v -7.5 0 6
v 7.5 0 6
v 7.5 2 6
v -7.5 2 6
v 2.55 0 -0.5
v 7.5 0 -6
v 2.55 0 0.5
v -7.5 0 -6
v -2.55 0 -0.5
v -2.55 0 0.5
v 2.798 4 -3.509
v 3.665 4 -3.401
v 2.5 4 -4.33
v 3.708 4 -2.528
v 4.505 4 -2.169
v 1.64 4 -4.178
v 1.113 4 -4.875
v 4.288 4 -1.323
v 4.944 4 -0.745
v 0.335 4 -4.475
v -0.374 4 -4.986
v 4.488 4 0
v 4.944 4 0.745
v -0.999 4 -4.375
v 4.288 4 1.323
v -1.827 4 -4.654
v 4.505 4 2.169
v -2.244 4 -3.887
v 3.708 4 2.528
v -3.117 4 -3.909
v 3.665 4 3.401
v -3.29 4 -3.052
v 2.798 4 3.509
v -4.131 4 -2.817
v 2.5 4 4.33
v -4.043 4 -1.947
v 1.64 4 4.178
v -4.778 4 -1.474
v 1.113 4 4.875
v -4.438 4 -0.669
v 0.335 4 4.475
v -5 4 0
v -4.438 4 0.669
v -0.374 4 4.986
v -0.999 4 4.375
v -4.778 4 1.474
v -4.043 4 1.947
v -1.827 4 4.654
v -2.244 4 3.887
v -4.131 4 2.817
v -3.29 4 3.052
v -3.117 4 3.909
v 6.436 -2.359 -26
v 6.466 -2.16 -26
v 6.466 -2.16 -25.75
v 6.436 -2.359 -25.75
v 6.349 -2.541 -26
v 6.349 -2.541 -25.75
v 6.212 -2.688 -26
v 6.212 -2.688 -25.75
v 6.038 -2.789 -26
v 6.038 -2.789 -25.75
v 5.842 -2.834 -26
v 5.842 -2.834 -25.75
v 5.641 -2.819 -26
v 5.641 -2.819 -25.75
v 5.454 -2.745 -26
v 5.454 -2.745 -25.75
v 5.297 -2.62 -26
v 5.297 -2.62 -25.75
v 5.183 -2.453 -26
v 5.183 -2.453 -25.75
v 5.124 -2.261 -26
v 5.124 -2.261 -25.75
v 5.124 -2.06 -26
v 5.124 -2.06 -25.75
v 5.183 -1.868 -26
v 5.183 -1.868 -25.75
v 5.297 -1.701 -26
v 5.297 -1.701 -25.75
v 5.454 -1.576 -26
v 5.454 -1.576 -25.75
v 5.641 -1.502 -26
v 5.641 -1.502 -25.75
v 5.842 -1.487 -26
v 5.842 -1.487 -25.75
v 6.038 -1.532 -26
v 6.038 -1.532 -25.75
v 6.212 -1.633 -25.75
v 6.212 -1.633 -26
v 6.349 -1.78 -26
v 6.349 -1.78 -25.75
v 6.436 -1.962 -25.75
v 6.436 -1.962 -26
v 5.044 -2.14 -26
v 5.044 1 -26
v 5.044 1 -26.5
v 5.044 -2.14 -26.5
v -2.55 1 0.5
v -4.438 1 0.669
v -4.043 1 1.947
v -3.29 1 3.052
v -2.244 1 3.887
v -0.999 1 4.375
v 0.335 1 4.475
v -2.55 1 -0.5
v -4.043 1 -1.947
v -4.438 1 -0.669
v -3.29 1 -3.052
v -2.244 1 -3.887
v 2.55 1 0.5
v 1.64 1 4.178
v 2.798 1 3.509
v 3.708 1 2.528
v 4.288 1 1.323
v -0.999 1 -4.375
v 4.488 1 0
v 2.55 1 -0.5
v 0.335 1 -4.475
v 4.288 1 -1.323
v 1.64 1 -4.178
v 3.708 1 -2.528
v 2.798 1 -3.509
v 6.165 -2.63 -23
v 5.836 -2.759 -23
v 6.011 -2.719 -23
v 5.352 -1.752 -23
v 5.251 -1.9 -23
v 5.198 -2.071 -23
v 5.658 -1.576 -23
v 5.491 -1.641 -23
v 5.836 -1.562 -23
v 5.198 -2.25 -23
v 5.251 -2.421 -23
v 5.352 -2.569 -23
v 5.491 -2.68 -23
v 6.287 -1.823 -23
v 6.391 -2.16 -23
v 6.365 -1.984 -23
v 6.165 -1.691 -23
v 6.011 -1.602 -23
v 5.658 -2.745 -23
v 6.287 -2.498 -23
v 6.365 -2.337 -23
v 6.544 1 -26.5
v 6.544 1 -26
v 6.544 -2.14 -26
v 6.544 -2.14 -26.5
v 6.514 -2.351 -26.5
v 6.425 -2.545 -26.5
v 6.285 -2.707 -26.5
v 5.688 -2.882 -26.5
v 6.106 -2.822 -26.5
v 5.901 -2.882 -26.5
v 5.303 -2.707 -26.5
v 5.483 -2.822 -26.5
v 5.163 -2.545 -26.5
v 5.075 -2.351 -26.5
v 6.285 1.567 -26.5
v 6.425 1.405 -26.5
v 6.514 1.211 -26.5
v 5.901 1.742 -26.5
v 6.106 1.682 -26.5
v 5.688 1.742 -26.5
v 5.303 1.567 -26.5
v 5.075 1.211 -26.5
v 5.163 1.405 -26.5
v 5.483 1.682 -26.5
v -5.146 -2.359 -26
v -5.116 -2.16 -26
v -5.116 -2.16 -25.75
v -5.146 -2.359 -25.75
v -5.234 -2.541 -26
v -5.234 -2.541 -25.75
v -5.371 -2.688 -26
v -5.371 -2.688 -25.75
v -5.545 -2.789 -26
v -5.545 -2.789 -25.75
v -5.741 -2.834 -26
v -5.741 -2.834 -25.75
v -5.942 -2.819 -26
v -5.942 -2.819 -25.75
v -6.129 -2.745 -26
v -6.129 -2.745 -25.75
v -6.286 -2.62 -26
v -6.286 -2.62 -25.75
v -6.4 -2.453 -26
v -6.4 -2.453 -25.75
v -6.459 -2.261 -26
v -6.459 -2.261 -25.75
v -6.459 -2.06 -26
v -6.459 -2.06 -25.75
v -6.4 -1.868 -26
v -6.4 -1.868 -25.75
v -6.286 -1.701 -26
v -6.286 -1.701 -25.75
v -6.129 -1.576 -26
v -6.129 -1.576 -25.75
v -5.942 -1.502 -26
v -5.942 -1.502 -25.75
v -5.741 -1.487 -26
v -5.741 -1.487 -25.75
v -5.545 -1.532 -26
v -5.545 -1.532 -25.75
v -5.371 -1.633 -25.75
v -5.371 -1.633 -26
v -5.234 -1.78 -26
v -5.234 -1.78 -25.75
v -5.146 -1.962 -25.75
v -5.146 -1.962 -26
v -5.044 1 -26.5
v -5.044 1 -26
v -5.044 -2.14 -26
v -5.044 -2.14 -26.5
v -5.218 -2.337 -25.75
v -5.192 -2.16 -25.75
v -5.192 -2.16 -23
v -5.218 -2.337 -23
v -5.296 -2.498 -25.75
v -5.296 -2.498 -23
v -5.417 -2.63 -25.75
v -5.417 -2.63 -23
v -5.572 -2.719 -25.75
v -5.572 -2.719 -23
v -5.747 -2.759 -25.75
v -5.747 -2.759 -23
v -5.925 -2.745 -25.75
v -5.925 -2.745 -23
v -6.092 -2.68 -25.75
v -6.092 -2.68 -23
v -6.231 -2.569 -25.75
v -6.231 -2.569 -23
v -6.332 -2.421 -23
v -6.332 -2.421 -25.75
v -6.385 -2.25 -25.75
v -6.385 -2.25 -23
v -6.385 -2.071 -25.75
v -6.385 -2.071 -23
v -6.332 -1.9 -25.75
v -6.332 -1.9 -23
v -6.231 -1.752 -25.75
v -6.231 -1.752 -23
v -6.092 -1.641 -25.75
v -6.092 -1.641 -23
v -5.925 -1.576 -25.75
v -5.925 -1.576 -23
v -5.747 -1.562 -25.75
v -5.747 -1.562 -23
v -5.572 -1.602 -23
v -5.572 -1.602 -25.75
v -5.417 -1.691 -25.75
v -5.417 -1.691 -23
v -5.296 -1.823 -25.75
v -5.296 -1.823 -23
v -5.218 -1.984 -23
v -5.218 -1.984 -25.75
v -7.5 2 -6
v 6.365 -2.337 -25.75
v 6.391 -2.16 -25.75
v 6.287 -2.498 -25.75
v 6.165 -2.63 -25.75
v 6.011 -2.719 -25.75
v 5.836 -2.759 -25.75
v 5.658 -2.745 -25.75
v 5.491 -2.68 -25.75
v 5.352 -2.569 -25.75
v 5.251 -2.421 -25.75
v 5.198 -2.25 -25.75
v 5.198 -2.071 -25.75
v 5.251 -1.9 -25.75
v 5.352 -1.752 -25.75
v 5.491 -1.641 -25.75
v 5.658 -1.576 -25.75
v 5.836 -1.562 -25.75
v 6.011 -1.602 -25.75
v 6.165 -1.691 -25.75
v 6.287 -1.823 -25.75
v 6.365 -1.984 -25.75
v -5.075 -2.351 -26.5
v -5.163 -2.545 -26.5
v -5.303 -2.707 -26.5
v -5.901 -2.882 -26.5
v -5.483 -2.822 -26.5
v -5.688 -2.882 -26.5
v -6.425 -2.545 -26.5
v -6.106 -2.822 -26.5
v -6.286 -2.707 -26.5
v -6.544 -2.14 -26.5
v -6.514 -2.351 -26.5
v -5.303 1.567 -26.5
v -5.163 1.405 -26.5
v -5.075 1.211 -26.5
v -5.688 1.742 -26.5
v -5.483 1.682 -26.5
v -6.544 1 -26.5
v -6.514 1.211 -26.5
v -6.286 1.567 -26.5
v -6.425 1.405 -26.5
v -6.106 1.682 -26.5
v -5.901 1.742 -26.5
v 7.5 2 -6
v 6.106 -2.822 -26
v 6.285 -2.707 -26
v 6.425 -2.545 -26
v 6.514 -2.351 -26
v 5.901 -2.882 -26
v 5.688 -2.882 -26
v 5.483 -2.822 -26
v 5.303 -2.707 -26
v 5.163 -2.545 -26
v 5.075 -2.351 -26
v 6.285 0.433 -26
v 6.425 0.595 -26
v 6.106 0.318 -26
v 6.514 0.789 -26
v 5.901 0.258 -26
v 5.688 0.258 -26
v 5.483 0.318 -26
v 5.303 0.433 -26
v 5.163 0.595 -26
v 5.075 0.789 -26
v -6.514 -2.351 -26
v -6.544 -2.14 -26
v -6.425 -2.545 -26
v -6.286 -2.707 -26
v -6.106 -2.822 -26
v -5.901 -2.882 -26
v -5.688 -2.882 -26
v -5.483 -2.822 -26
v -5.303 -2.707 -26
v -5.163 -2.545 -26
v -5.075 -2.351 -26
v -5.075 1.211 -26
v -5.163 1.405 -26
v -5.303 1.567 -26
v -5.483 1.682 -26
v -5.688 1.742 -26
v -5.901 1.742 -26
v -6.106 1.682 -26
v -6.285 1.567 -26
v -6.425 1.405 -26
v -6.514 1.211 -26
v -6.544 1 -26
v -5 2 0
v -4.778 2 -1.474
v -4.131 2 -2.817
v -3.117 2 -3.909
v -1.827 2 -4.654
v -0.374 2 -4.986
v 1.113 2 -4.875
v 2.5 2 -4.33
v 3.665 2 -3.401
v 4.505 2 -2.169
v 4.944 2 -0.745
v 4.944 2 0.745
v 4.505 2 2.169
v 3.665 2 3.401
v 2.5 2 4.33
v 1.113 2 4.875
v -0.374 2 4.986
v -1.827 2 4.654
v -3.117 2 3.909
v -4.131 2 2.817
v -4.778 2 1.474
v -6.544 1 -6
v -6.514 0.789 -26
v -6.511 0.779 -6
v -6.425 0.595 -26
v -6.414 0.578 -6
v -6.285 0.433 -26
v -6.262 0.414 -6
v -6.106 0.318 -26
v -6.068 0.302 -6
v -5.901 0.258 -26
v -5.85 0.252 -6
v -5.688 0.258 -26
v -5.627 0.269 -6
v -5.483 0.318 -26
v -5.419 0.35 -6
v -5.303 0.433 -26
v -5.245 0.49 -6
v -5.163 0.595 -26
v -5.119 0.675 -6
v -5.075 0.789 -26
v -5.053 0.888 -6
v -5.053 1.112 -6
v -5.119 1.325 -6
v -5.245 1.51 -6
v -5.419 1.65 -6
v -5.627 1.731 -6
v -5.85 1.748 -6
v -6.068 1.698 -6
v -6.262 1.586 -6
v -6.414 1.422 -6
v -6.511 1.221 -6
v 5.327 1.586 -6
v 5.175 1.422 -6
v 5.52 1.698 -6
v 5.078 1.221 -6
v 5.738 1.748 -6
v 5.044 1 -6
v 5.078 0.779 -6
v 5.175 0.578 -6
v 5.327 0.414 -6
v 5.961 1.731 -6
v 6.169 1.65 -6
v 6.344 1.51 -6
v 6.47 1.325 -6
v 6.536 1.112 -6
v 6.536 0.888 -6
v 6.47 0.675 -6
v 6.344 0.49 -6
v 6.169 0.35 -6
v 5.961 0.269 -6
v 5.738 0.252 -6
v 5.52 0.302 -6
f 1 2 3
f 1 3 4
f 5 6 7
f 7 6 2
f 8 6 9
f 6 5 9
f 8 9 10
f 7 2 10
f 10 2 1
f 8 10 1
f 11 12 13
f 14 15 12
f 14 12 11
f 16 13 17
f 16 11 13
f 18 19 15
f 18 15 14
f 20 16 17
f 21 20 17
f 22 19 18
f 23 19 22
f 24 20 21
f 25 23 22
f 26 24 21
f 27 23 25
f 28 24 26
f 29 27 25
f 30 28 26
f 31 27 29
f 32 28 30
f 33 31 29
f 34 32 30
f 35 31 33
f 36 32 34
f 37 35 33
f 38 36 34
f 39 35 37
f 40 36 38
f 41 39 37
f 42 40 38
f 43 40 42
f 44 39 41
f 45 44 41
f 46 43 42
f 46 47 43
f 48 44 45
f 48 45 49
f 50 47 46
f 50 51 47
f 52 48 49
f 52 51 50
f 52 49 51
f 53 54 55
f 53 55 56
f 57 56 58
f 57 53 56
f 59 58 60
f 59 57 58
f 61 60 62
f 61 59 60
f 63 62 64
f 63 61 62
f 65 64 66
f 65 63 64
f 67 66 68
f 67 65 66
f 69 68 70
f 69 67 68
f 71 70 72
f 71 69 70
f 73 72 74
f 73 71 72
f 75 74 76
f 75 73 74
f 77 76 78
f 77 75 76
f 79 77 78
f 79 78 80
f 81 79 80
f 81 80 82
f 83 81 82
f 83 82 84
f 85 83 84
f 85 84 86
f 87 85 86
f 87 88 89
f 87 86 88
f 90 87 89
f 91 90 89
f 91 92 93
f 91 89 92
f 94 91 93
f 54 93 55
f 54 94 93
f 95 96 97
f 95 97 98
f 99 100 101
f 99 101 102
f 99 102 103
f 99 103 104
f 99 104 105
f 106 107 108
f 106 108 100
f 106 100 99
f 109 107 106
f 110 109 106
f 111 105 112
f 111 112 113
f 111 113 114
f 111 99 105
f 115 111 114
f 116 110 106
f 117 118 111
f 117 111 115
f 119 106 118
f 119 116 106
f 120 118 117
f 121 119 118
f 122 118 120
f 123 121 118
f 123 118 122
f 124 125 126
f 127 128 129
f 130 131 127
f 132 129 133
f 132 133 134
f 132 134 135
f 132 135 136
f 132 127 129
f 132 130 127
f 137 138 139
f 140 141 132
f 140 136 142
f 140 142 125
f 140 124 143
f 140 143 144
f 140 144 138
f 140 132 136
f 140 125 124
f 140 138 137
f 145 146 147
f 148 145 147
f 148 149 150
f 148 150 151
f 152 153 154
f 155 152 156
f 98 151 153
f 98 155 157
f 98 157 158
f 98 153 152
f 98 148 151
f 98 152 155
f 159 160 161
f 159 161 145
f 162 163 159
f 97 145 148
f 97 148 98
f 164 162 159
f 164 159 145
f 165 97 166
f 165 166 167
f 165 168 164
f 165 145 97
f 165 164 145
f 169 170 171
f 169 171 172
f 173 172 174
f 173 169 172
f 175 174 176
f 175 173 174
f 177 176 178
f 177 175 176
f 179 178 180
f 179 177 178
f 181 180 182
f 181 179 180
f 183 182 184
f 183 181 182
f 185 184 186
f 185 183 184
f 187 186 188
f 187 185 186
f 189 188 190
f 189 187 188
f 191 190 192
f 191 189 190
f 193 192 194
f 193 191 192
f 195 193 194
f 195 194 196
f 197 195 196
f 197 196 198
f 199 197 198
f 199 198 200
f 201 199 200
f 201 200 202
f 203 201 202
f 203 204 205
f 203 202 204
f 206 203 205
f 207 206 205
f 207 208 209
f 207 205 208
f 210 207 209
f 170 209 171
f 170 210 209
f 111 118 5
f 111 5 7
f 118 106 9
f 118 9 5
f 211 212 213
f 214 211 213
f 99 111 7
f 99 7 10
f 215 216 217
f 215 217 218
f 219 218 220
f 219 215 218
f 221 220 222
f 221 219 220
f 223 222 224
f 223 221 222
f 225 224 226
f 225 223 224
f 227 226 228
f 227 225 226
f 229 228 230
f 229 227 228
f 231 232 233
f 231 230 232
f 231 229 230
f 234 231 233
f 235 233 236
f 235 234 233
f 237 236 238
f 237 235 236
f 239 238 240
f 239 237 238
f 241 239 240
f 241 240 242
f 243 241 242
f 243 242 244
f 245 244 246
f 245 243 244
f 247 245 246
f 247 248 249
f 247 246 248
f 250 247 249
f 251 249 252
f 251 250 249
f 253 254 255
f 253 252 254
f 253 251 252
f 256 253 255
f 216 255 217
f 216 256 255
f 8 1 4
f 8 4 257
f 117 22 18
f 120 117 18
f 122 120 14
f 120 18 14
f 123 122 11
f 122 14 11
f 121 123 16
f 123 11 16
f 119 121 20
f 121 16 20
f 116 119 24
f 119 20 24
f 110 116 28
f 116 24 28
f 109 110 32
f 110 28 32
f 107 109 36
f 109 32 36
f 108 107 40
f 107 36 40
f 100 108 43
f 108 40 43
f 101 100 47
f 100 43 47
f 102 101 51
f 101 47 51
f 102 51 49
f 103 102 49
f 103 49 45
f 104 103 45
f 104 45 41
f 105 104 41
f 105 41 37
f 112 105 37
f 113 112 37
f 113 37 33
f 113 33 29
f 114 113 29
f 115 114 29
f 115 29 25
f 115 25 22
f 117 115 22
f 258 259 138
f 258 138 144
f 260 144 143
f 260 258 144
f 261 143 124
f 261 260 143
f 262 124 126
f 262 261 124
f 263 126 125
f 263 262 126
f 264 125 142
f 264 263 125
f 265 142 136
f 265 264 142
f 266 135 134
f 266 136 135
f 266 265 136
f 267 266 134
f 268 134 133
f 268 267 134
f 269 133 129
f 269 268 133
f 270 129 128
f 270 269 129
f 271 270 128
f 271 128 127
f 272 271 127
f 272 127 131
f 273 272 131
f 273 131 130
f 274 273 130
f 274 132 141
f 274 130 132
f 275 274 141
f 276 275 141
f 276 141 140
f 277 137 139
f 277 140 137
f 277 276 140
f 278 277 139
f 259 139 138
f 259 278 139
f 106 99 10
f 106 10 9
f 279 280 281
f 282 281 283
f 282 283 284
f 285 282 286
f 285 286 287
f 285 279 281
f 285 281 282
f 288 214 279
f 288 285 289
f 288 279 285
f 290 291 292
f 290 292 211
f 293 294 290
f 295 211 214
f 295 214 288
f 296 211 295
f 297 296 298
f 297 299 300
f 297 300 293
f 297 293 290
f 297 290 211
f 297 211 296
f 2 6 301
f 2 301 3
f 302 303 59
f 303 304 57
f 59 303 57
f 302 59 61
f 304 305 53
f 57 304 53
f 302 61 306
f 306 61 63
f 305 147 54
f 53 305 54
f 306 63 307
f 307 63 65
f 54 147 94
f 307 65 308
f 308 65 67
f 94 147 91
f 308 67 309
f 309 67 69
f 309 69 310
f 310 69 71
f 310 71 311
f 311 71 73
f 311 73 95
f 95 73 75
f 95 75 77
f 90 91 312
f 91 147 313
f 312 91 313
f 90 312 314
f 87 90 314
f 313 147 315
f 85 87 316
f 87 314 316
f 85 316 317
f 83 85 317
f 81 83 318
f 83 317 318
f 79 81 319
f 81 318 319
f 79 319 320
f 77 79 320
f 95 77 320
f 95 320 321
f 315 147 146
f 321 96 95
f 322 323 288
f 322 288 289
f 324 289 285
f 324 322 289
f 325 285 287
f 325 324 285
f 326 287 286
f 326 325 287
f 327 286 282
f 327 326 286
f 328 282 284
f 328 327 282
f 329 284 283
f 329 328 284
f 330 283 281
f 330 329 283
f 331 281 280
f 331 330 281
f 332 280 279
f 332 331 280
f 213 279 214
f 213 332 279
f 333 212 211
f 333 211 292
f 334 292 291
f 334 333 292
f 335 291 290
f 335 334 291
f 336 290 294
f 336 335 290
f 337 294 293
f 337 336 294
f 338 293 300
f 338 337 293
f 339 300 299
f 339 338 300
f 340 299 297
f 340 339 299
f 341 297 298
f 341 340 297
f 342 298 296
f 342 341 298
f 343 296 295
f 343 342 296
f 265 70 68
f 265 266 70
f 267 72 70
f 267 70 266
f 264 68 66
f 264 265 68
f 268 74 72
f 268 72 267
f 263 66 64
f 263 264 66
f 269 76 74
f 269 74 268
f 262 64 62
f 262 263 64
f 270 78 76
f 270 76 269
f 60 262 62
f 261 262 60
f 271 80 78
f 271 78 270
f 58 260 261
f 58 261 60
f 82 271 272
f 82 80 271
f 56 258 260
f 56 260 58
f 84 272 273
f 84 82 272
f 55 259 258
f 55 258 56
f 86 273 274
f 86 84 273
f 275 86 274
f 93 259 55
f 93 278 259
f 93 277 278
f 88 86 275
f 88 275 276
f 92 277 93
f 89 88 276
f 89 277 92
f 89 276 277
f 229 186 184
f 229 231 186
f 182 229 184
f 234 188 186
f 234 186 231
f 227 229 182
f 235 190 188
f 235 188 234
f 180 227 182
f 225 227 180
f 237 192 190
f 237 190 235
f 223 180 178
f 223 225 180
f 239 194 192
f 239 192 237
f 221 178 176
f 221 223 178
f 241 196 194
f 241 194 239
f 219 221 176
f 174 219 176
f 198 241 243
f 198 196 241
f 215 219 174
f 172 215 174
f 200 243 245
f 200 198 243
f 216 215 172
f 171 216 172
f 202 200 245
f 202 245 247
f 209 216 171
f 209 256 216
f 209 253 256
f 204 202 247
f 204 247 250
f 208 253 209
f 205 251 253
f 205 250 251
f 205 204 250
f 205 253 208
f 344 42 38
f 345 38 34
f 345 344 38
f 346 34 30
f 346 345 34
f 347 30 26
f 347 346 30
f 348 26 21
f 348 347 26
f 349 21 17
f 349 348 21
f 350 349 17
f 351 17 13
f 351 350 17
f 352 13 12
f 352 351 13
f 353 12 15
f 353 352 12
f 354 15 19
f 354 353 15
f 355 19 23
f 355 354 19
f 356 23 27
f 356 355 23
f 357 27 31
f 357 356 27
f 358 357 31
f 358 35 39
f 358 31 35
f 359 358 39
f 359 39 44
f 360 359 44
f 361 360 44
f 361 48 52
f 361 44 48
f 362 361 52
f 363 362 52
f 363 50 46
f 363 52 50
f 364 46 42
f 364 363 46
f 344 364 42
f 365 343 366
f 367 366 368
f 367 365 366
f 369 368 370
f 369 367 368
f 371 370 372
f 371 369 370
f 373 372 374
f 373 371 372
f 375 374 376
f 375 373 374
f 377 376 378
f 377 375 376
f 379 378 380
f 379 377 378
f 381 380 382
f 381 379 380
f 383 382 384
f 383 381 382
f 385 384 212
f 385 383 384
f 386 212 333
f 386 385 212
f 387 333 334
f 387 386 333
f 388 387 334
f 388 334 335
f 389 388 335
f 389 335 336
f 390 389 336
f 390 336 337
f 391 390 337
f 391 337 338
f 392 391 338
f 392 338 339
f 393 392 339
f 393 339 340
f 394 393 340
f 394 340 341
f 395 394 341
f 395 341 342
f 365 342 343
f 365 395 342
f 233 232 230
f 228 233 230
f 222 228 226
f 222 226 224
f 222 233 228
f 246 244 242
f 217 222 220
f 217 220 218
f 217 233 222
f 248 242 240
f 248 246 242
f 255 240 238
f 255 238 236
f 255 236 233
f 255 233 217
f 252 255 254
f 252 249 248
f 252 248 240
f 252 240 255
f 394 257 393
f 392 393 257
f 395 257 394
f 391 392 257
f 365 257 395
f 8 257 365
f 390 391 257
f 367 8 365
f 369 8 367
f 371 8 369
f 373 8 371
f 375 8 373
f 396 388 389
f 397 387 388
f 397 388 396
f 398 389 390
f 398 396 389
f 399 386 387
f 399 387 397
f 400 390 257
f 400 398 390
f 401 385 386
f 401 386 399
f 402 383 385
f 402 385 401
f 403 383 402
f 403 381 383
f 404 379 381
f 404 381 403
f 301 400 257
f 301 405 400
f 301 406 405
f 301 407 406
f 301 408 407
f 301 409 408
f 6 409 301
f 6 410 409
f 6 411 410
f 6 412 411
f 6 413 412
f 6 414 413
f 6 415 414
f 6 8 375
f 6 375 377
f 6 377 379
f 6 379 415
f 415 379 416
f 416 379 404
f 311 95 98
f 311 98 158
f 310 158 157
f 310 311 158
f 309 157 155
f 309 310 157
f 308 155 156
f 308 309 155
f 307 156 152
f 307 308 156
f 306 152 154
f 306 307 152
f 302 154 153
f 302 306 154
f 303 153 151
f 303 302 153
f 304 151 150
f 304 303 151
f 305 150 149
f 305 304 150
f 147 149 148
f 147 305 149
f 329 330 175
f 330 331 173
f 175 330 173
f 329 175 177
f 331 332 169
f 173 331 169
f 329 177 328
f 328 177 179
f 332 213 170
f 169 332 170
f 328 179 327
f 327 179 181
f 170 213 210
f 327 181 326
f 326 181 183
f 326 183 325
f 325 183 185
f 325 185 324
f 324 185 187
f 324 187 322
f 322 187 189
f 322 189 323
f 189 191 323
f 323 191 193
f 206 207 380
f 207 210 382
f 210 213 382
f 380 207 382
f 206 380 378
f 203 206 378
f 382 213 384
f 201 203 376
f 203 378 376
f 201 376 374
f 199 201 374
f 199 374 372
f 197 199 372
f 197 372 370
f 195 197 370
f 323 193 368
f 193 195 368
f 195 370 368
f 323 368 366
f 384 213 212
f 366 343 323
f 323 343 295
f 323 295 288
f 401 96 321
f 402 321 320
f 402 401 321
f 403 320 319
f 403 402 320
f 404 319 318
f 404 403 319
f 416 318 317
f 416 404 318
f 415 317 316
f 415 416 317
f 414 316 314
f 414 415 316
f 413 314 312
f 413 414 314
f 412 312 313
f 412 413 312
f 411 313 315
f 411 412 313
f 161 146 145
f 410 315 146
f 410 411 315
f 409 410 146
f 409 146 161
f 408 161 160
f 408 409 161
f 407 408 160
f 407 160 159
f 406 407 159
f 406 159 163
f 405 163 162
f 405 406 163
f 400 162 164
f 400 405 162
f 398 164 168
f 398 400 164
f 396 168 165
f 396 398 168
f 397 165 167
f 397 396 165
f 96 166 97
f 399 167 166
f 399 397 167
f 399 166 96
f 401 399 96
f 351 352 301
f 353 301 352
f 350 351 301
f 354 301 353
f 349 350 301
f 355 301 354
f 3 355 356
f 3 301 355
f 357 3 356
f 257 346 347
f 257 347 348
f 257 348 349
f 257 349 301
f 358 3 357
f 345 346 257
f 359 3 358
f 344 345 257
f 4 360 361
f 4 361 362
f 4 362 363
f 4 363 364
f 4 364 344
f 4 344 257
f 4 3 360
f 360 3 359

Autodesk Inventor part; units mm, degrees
ref_plane "YZ Plane" through (0, 0, 0) normal (1, 0, 0) x (0, 1, 0)
ref_plane "XZ Plane" through (0, 0, 0) normal (0, 1, 0) x (-1, 0, 0)
ref_plane "XY Plane" through (0, 0, 0) normal (0, 0, 1) x (1, 0, 0)
sketch "Sketch1" plane through (0, 0, 0) normal (0, 1, 0) x (-1, 0, 0)
  line L0 (2.55, 0.5) -> (-2.55, 0.5)
  line L1 (-2.55, 0.5) -> (-2.55, -0.5)
  line L2 (-2.55, -0.5) -> (2.55, -0.5)
  line L3 (2.55, -0.5) -> (2.55, 0.5)
  line L4 (-2.55, 0) -> (2.55, 0) construction
  point P0 (0, 0)
  point P1 (0, -0.5)
  point P2 (0, 0)
  dimension "d0" = 5.1
  dimension "d1" = 1
sketch "Sketch2" plane through (0, 0, 0) normal (0, 1, 0) x (-1, 0, 0)
  circle A0 centre (0, 0) radius 5
  dimension "d4" = 10
sketch "Sketch3" plane through (0, 0, 0) normal (0, 1, 0) x (-1, 0, 0)
  line L0 (7.5, -6) -> (-7.5, -6)
  line L1 (-7.5, -6) -> (-7.5, 6)
  line L2 (-7.5, 6) -> (7.5, 6)
  line L3 (7.5, 6) -> (7.5, -6)
  line L4 (7.5, 0) -> (-7.5, 0) construction
  line L5 (0, -6) -> (0, 6) construction
  point P0 (0, 0)
  point P1 (0, 0)
  dimension "d2" = 15
  dimension "d3" = 12
extrude "Extrusion1" add sketch "Sketch3" along normal blind 2
extrude "Extrusion2" cut sketch "Sketch1" along normal blind 2
extrude "Extrusion4" add sketch "Sketch2" along normal blind 4
sketch "Sketch7" plane through (0, 4, 0) normal (0, 1, 0) x (1, 0, 0)
  circle A0 centre (0, 0) radius 4.4878
extrude "Extrusion5" cut sketch "Sketch7" against normal blind 3
sketch "Sketch8" plane through (0, 1, 0) normal (0, 1, 0) x (1, 0, 0)
  line L0 (-2.55, 0.5) -> (2.55, 0.5)
  line L1 (2.55, 0.5) -> (2.55, -0.5)
  line L2 (2.55, -0.5) -> (-2.55, -0.5)
  line L3 (-2.55, -0.5) -> (-2.55, 0.5)
  line L4 (-2.55, 0) -> (2.55, 0) construction
  line L5 (0, 0.5) -> (0, -0.5) construction
  point P0 (0, 0)
  point P1 (0, 0)
  dimension "d15" = 5.1
  dimension "d16" = 1
extrude "Extrusion6" cut sketch "Sketch8" against normal blind 3
sketch "Sketch9" plane through (7.5, 0, -6) normal (0, 0, -1) x (-1, 0, 0)
  circle A0 centre (13.2943, 1) radius 0.75
  line L0 (7.5, 0) -> (7.5, 2) construction
  line L1 (2.5, 2) -> (12.5, 2) construction
  circle A1 centre (1.7057, 1) radius 0.75
  dimension "d19" = 1.5
extrude "Extrusion7" add sketch "Sketch9" along normal blind 20
sketch "Sketch14" plane through (5.7943, 1, -26) normal (0, 0, -1) x (-1, 0, 0)
  circle A0 centre (0, -3.14) radius 0.75
  circle A1 centre (11.5887, -3.14) radius 0.75
  circle A2 centre (11.5887, 0) radius 0.75 projected
  line L0 (10.8387, 0) -> (10.8387, -3.14)
  line L1 (12.3387, 0) -> (12.3387, -3.14)
  circle A3 centre (0, 0) radius 0.75 projected
  line L2 (-0.75, 0) -> (-0.75, -3.14)
  line L3 (0.75, 0) -> (0.75, -3.14)
  point P0 (5.7943, -1)
  dimension "d25" = 1.5
  dimension "d26" = 1.5
extrude "Extrusion8" add sketch "Sketch14" along normal blind 0.5
sketch "Sketch17" plane through (5.7943, 1, -26) normal (0, 0, 1) x (1, 0, 0)
  line L0 (-13.2943, -1) -> (1.7057, -1) construction
  line L1 (-0.0029, -1) -> (-0.0029, -3.1605) construction
  circle A0 centre (-0.0029, -3.1605) radius 0.6 construction
  line L2 (-5.7943, -1) -> (-5.7943, -3.1605) construction
  circle A1 centre (-0.0029, -3.1605) radius 0.6
  circle A2 centre (-11.5858, -3.1605) radius 0.6 construction
  circle A3 centre (-11.5858, -3.1605) radius 0.6
  circle A4 centre (-0.0029, -3.1605) radius 0.675
  circle A5 centre (-11.5858, -3.1605) radius 0.675
  dimension "d29" = 1.2
  dimension "d32" = 1.35
  dimension "d33" = 1.35
extrude "Extrusion9" add sketch "Sketch17" along normal blind 3 contours A1 | A3
sketch "Sketch19" plane through (5.7943, 1, -26) normal (0, 0, 1) x (1, 0, 0)
  circle A0 centre (-11.5858, -3.1605) radius 0.6 projected
  circle A1 centre (-11.5858, -3.1605) radius 0.675
  circle A2 centre (-0.0029, -3.1605) radius 0.6 projected
  circle A3 centre (-0.0029, -3.1605) radius 0.675
  point P0 (-5.7943, -1)
  dimension "d34" = 1.35
  dimension "d35" = 1.35
extrude "Extrusion10" add sketch "Sketch19" along normal blind 0.25
properties part number "LDR_case"
